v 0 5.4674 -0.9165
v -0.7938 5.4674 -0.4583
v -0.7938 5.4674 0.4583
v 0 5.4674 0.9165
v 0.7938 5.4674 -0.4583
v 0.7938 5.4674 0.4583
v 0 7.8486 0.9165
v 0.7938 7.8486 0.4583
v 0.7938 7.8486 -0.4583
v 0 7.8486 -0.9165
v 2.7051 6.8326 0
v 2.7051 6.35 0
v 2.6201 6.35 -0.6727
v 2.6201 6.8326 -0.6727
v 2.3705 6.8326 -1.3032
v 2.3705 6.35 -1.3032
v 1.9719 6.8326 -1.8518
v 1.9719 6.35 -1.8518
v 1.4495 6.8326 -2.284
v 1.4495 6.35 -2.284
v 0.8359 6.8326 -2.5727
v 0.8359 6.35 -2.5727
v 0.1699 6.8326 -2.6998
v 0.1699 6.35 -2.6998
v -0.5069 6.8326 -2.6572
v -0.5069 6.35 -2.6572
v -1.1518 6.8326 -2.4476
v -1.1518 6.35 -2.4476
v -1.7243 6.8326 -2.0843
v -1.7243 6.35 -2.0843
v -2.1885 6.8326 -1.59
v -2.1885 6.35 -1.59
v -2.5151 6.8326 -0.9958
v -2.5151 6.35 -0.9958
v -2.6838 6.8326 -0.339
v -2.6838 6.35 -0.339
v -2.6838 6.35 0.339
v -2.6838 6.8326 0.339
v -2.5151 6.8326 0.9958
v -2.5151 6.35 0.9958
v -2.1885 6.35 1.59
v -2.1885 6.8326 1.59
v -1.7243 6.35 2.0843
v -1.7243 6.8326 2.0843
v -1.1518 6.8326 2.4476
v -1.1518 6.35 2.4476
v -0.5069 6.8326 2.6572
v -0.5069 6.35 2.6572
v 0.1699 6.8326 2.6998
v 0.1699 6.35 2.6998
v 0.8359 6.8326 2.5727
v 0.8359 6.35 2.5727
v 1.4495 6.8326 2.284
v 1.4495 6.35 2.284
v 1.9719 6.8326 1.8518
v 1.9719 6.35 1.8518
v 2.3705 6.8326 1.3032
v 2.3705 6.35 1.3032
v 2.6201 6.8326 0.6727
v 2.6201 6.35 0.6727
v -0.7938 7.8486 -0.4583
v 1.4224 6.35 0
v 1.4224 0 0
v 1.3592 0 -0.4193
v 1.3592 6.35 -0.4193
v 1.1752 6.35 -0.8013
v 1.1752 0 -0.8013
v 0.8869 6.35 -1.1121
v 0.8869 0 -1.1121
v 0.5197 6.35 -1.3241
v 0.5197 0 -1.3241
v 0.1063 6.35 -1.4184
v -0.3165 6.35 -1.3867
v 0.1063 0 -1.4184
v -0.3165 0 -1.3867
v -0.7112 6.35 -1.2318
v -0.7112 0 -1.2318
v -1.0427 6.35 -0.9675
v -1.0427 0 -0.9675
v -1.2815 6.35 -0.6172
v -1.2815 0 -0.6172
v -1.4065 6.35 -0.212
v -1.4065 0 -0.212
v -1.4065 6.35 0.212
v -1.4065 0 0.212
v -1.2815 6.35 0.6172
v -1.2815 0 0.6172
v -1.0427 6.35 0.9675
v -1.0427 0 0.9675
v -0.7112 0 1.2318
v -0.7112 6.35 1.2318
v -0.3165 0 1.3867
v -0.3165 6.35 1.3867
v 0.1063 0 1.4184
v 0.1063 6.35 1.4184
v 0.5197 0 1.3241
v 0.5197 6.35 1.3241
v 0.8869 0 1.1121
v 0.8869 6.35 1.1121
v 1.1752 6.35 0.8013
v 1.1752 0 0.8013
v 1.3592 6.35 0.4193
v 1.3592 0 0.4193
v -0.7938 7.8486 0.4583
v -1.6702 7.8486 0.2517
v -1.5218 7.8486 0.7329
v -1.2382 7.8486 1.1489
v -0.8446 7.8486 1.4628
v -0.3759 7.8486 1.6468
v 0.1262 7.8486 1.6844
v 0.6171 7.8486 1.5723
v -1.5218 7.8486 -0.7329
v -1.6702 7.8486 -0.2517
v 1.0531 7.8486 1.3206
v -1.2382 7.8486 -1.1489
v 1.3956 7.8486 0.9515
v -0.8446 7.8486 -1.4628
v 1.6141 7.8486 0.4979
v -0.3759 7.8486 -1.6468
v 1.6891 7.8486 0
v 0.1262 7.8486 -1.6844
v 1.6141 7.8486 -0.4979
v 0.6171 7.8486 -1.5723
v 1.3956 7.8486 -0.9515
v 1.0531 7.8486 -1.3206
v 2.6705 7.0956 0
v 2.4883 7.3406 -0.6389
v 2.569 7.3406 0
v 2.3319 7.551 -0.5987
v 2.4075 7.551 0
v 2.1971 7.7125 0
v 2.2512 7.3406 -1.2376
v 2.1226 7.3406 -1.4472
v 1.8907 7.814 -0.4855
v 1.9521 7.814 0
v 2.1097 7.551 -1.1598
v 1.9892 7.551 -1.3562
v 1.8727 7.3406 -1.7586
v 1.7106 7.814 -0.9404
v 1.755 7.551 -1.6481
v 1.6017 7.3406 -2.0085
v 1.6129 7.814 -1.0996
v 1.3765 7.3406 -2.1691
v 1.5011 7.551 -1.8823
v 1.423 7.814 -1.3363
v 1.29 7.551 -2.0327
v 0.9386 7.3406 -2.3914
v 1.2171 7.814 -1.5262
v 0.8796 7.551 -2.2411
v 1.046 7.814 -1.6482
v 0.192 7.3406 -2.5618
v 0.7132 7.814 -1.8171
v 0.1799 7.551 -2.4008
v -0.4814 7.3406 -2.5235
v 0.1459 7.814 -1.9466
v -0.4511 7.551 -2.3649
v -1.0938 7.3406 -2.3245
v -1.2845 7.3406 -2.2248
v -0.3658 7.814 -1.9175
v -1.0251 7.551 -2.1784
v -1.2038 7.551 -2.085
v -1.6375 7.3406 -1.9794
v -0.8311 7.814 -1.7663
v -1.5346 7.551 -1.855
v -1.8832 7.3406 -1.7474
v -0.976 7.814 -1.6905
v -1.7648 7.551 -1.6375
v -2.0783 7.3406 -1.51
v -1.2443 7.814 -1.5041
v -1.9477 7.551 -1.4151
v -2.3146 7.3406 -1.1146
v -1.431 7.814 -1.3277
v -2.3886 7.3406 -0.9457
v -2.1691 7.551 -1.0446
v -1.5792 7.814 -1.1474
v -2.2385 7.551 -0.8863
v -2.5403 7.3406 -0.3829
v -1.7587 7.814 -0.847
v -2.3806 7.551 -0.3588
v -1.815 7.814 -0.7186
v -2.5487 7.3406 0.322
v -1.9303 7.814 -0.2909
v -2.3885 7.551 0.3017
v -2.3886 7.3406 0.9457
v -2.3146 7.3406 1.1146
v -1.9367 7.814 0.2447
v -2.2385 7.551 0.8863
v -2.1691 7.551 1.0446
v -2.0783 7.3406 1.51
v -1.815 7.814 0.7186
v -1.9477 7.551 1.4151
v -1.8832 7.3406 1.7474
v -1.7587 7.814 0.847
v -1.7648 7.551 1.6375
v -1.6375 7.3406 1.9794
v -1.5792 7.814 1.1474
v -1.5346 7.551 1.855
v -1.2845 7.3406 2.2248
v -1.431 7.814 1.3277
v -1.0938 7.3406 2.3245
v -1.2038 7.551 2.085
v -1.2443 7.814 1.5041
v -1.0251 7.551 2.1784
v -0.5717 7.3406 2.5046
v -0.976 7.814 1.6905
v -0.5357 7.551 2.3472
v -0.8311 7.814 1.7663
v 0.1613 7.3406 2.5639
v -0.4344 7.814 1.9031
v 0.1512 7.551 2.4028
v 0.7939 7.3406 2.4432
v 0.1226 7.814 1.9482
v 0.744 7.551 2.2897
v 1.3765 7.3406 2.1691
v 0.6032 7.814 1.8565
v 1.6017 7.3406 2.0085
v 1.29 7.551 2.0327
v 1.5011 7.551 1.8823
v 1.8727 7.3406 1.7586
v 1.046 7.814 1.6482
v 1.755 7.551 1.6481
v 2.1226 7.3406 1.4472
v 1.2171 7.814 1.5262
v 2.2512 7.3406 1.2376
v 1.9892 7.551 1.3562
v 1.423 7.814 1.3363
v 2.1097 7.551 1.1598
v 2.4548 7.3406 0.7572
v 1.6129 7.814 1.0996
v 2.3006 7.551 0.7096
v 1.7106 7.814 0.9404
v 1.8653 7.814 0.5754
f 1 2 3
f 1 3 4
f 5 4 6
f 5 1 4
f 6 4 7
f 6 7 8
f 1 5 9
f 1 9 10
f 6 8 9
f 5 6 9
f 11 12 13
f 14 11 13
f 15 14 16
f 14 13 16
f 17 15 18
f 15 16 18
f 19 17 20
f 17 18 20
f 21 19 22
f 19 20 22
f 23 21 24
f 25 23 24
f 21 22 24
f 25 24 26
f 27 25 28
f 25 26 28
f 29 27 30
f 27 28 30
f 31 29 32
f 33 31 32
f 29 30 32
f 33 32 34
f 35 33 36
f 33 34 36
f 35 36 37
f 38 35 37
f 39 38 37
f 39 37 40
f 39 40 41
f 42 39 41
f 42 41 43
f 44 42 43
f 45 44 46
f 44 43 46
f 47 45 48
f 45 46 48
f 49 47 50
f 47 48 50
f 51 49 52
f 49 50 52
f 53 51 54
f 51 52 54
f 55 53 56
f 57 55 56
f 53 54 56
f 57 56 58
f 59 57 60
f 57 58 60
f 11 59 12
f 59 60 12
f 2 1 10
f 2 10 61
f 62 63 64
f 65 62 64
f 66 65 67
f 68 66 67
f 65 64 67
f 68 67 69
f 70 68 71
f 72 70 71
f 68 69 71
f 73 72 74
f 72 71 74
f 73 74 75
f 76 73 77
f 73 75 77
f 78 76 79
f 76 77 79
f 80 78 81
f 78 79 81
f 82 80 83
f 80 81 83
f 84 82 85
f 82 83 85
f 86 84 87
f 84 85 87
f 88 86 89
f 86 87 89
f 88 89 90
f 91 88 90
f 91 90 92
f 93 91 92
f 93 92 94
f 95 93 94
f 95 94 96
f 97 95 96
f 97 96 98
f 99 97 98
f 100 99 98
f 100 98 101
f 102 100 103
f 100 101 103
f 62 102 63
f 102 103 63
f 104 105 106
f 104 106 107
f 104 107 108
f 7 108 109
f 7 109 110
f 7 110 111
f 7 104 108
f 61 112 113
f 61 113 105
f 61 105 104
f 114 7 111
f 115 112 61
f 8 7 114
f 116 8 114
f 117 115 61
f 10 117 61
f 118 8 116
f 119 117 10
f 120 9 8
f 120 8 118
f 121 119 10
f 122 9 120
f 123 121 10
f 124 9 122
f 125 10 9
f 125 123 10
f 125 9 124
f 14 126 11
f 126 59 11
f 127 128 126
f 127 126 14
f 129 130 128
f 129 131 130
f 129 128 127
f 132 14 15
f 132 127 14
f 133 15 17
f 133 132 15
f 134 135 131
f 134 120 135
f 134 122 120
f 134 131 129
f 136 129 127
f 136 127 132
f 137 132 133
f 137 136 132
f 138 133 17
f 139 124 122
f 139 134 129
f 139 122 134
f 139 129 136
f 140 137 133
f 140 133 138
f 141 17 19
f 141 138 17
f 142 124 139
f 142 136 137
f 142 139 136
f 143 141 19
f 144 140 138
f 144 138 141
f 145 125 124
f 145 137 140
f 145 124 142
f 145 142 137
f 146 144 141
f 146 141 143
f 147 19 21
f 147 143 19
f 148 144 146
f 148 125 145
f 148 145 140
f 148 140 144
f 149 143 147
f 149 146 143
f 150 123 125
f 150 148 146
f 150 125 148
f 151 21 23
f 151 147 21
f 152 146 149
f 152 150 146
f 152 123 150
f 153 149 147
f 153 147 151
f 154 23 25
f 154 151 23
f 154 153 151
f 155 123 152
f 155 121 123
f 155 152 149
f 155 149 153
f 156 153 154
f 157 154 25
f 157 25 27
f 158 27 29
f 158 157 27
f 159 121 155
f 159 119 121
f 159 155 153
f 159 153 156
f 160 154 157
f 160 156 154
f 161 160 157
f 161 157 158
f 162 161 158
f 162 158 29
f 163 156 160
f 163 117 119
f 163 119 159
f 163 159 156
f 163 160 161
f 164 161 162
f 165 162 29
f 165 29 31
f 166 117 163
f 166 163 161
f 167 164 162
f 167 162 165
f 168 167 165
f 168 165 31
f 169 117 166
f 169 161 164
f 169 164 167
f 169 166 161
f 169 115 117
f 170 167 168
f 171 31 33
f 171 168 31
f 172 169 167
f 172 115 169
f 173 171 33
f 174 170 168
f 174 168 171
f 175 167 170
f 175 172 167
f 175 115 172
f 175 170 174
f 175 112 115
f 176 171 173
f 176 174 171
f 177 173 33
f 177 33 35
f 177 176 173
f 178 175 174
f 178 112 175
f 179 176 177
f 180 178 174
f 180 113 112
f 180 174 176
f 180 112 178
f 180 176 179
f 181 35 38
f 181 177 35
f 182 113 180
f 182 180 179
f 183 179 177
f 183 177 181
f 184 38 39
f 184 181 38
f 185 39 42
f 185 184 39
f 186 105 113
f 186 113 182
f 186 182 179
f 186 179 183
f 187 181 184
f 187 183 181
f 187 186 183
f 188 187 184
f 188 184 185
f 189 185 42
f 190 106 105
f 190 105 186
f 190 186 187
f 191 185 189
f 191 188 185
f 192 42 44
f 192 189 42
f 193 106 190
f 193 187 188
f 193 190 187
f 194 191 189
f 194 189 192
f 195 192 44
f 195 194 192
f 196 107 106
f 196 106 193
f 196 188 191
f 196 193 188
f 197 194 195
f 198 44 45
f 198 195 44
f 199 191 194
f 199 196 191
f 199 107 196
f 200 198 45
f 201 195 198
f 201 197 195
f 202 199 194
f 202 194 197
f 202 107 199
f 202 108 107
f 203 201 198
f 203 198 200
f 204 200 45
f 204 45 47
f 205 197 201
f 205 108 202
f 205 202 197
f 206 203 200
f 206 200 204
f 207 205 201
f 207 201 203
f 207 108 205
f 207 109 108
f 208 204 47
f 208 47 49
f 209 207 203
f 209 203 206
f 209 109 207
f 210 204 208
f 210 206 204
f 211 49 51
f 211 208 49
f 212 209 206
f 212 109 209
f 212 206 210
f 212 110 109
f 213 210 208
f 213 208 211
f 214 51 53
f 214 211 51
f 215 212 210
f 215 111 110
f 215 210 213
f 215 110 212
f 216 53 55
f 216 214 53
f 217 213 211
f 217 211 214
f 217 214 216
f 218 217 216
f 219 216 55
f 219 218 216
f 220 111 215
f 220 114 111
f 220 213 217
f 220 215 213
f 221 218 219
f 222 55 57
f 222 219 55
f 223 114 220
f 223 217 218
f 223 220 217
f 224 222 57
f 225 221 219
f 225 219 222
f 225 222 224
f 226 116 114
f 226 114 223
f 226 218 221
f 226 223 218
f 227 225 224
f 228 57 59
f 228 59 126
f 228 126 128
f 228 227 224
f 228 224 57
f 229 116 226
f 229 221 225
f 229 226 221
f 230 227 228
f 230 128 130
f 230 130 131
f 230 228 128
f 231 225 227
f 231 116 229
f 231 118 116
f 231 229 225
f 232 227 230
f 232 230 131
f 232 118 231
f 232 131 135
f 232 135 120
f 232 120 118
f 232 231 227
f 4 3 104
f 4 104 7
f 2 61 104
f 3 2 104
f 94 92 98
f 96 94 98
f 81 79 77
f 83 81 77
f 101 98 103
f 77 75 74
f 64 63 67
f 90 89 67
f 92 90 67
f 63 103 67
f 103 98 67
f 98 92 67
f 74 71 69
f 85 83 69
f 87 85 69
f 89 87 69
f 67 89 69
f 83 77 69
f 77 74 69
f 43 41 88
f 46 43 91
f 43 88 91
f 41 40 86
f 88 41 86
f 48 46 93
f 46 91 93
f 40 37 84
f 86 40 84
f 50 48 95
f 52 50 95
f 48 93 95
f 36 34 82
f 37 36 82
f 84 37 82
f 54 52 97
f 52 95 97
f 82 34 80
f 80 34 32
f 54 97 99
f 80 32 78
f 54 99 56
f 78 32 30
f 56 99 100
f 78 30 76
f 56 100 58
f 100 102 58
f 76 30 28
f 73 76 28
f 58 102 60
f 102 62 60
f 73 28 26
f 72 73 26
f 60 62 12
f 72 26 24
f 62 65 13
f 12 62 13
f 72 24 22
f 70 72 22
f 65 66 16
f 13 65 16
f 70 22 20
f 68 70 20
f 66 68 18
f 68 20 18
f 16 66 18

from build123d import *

# Parameters (mm, degrees)
SKETCH1_R           = 1.4224
BOSS_EXTRUDE1_DEPTH = 6.35
SKETCH2_R           = 2.7051
BOSS_EXTRUDE2_DEPTH = 1.4986
FILLET1_R           = 1.016
CUT_EXTRUDE1_DEPTH  = 2.38125


with BuildPart() as part:
    # Sketch1 → Boss-Extrude1 (new body)
    with BuildSketch(Plane(origin=(0, 0, 0), x_dir=(1, 0, 0), z_dir=(0, 1, 0))):
        Circle(SKETCH1_R)
    extrude(amount=BOSS_EXTRUDE1_DEPTH)

    # Sketch2 → Boss-Extrude2 (add)
    with BuildSketch(Plane(origin=(0, 6.35, 0), x_dir=(1, 0, 0), z_dir=(0, 1, 0))):
        Circle(SKETCH2_R)
    extrude(amount=BOSS_EXTRUDE2_DEPTH)

    # Fillet1
    fillet1_edges = [part.edges().sort_by_distance(p)[0] for p in [
        (-2.7051, 7.8486, 0),
    ]]
    fillet(fillet1_edges, radius=FILLET1_R)

    # Sketch3 → Cut-Extrude1 (cut)
    with BuildSketch(Plane(origin=(0, 7.8486, 0), x_dir=(1, 0, 0), z_dir=(0, 1, 0))):
        Polygon((0, 0.916543552), (-0.79375, 0.458271776), (-0.79375, -0.458271776), (0, -0.916543552), (0.79375, -0.458271776), (0.79375, 0.458271776), align=None)
    extrude(amount=-CUT_EXTRUDE1_DEPTH, mode=Mode.SUBTRACT)


solid = part.part
